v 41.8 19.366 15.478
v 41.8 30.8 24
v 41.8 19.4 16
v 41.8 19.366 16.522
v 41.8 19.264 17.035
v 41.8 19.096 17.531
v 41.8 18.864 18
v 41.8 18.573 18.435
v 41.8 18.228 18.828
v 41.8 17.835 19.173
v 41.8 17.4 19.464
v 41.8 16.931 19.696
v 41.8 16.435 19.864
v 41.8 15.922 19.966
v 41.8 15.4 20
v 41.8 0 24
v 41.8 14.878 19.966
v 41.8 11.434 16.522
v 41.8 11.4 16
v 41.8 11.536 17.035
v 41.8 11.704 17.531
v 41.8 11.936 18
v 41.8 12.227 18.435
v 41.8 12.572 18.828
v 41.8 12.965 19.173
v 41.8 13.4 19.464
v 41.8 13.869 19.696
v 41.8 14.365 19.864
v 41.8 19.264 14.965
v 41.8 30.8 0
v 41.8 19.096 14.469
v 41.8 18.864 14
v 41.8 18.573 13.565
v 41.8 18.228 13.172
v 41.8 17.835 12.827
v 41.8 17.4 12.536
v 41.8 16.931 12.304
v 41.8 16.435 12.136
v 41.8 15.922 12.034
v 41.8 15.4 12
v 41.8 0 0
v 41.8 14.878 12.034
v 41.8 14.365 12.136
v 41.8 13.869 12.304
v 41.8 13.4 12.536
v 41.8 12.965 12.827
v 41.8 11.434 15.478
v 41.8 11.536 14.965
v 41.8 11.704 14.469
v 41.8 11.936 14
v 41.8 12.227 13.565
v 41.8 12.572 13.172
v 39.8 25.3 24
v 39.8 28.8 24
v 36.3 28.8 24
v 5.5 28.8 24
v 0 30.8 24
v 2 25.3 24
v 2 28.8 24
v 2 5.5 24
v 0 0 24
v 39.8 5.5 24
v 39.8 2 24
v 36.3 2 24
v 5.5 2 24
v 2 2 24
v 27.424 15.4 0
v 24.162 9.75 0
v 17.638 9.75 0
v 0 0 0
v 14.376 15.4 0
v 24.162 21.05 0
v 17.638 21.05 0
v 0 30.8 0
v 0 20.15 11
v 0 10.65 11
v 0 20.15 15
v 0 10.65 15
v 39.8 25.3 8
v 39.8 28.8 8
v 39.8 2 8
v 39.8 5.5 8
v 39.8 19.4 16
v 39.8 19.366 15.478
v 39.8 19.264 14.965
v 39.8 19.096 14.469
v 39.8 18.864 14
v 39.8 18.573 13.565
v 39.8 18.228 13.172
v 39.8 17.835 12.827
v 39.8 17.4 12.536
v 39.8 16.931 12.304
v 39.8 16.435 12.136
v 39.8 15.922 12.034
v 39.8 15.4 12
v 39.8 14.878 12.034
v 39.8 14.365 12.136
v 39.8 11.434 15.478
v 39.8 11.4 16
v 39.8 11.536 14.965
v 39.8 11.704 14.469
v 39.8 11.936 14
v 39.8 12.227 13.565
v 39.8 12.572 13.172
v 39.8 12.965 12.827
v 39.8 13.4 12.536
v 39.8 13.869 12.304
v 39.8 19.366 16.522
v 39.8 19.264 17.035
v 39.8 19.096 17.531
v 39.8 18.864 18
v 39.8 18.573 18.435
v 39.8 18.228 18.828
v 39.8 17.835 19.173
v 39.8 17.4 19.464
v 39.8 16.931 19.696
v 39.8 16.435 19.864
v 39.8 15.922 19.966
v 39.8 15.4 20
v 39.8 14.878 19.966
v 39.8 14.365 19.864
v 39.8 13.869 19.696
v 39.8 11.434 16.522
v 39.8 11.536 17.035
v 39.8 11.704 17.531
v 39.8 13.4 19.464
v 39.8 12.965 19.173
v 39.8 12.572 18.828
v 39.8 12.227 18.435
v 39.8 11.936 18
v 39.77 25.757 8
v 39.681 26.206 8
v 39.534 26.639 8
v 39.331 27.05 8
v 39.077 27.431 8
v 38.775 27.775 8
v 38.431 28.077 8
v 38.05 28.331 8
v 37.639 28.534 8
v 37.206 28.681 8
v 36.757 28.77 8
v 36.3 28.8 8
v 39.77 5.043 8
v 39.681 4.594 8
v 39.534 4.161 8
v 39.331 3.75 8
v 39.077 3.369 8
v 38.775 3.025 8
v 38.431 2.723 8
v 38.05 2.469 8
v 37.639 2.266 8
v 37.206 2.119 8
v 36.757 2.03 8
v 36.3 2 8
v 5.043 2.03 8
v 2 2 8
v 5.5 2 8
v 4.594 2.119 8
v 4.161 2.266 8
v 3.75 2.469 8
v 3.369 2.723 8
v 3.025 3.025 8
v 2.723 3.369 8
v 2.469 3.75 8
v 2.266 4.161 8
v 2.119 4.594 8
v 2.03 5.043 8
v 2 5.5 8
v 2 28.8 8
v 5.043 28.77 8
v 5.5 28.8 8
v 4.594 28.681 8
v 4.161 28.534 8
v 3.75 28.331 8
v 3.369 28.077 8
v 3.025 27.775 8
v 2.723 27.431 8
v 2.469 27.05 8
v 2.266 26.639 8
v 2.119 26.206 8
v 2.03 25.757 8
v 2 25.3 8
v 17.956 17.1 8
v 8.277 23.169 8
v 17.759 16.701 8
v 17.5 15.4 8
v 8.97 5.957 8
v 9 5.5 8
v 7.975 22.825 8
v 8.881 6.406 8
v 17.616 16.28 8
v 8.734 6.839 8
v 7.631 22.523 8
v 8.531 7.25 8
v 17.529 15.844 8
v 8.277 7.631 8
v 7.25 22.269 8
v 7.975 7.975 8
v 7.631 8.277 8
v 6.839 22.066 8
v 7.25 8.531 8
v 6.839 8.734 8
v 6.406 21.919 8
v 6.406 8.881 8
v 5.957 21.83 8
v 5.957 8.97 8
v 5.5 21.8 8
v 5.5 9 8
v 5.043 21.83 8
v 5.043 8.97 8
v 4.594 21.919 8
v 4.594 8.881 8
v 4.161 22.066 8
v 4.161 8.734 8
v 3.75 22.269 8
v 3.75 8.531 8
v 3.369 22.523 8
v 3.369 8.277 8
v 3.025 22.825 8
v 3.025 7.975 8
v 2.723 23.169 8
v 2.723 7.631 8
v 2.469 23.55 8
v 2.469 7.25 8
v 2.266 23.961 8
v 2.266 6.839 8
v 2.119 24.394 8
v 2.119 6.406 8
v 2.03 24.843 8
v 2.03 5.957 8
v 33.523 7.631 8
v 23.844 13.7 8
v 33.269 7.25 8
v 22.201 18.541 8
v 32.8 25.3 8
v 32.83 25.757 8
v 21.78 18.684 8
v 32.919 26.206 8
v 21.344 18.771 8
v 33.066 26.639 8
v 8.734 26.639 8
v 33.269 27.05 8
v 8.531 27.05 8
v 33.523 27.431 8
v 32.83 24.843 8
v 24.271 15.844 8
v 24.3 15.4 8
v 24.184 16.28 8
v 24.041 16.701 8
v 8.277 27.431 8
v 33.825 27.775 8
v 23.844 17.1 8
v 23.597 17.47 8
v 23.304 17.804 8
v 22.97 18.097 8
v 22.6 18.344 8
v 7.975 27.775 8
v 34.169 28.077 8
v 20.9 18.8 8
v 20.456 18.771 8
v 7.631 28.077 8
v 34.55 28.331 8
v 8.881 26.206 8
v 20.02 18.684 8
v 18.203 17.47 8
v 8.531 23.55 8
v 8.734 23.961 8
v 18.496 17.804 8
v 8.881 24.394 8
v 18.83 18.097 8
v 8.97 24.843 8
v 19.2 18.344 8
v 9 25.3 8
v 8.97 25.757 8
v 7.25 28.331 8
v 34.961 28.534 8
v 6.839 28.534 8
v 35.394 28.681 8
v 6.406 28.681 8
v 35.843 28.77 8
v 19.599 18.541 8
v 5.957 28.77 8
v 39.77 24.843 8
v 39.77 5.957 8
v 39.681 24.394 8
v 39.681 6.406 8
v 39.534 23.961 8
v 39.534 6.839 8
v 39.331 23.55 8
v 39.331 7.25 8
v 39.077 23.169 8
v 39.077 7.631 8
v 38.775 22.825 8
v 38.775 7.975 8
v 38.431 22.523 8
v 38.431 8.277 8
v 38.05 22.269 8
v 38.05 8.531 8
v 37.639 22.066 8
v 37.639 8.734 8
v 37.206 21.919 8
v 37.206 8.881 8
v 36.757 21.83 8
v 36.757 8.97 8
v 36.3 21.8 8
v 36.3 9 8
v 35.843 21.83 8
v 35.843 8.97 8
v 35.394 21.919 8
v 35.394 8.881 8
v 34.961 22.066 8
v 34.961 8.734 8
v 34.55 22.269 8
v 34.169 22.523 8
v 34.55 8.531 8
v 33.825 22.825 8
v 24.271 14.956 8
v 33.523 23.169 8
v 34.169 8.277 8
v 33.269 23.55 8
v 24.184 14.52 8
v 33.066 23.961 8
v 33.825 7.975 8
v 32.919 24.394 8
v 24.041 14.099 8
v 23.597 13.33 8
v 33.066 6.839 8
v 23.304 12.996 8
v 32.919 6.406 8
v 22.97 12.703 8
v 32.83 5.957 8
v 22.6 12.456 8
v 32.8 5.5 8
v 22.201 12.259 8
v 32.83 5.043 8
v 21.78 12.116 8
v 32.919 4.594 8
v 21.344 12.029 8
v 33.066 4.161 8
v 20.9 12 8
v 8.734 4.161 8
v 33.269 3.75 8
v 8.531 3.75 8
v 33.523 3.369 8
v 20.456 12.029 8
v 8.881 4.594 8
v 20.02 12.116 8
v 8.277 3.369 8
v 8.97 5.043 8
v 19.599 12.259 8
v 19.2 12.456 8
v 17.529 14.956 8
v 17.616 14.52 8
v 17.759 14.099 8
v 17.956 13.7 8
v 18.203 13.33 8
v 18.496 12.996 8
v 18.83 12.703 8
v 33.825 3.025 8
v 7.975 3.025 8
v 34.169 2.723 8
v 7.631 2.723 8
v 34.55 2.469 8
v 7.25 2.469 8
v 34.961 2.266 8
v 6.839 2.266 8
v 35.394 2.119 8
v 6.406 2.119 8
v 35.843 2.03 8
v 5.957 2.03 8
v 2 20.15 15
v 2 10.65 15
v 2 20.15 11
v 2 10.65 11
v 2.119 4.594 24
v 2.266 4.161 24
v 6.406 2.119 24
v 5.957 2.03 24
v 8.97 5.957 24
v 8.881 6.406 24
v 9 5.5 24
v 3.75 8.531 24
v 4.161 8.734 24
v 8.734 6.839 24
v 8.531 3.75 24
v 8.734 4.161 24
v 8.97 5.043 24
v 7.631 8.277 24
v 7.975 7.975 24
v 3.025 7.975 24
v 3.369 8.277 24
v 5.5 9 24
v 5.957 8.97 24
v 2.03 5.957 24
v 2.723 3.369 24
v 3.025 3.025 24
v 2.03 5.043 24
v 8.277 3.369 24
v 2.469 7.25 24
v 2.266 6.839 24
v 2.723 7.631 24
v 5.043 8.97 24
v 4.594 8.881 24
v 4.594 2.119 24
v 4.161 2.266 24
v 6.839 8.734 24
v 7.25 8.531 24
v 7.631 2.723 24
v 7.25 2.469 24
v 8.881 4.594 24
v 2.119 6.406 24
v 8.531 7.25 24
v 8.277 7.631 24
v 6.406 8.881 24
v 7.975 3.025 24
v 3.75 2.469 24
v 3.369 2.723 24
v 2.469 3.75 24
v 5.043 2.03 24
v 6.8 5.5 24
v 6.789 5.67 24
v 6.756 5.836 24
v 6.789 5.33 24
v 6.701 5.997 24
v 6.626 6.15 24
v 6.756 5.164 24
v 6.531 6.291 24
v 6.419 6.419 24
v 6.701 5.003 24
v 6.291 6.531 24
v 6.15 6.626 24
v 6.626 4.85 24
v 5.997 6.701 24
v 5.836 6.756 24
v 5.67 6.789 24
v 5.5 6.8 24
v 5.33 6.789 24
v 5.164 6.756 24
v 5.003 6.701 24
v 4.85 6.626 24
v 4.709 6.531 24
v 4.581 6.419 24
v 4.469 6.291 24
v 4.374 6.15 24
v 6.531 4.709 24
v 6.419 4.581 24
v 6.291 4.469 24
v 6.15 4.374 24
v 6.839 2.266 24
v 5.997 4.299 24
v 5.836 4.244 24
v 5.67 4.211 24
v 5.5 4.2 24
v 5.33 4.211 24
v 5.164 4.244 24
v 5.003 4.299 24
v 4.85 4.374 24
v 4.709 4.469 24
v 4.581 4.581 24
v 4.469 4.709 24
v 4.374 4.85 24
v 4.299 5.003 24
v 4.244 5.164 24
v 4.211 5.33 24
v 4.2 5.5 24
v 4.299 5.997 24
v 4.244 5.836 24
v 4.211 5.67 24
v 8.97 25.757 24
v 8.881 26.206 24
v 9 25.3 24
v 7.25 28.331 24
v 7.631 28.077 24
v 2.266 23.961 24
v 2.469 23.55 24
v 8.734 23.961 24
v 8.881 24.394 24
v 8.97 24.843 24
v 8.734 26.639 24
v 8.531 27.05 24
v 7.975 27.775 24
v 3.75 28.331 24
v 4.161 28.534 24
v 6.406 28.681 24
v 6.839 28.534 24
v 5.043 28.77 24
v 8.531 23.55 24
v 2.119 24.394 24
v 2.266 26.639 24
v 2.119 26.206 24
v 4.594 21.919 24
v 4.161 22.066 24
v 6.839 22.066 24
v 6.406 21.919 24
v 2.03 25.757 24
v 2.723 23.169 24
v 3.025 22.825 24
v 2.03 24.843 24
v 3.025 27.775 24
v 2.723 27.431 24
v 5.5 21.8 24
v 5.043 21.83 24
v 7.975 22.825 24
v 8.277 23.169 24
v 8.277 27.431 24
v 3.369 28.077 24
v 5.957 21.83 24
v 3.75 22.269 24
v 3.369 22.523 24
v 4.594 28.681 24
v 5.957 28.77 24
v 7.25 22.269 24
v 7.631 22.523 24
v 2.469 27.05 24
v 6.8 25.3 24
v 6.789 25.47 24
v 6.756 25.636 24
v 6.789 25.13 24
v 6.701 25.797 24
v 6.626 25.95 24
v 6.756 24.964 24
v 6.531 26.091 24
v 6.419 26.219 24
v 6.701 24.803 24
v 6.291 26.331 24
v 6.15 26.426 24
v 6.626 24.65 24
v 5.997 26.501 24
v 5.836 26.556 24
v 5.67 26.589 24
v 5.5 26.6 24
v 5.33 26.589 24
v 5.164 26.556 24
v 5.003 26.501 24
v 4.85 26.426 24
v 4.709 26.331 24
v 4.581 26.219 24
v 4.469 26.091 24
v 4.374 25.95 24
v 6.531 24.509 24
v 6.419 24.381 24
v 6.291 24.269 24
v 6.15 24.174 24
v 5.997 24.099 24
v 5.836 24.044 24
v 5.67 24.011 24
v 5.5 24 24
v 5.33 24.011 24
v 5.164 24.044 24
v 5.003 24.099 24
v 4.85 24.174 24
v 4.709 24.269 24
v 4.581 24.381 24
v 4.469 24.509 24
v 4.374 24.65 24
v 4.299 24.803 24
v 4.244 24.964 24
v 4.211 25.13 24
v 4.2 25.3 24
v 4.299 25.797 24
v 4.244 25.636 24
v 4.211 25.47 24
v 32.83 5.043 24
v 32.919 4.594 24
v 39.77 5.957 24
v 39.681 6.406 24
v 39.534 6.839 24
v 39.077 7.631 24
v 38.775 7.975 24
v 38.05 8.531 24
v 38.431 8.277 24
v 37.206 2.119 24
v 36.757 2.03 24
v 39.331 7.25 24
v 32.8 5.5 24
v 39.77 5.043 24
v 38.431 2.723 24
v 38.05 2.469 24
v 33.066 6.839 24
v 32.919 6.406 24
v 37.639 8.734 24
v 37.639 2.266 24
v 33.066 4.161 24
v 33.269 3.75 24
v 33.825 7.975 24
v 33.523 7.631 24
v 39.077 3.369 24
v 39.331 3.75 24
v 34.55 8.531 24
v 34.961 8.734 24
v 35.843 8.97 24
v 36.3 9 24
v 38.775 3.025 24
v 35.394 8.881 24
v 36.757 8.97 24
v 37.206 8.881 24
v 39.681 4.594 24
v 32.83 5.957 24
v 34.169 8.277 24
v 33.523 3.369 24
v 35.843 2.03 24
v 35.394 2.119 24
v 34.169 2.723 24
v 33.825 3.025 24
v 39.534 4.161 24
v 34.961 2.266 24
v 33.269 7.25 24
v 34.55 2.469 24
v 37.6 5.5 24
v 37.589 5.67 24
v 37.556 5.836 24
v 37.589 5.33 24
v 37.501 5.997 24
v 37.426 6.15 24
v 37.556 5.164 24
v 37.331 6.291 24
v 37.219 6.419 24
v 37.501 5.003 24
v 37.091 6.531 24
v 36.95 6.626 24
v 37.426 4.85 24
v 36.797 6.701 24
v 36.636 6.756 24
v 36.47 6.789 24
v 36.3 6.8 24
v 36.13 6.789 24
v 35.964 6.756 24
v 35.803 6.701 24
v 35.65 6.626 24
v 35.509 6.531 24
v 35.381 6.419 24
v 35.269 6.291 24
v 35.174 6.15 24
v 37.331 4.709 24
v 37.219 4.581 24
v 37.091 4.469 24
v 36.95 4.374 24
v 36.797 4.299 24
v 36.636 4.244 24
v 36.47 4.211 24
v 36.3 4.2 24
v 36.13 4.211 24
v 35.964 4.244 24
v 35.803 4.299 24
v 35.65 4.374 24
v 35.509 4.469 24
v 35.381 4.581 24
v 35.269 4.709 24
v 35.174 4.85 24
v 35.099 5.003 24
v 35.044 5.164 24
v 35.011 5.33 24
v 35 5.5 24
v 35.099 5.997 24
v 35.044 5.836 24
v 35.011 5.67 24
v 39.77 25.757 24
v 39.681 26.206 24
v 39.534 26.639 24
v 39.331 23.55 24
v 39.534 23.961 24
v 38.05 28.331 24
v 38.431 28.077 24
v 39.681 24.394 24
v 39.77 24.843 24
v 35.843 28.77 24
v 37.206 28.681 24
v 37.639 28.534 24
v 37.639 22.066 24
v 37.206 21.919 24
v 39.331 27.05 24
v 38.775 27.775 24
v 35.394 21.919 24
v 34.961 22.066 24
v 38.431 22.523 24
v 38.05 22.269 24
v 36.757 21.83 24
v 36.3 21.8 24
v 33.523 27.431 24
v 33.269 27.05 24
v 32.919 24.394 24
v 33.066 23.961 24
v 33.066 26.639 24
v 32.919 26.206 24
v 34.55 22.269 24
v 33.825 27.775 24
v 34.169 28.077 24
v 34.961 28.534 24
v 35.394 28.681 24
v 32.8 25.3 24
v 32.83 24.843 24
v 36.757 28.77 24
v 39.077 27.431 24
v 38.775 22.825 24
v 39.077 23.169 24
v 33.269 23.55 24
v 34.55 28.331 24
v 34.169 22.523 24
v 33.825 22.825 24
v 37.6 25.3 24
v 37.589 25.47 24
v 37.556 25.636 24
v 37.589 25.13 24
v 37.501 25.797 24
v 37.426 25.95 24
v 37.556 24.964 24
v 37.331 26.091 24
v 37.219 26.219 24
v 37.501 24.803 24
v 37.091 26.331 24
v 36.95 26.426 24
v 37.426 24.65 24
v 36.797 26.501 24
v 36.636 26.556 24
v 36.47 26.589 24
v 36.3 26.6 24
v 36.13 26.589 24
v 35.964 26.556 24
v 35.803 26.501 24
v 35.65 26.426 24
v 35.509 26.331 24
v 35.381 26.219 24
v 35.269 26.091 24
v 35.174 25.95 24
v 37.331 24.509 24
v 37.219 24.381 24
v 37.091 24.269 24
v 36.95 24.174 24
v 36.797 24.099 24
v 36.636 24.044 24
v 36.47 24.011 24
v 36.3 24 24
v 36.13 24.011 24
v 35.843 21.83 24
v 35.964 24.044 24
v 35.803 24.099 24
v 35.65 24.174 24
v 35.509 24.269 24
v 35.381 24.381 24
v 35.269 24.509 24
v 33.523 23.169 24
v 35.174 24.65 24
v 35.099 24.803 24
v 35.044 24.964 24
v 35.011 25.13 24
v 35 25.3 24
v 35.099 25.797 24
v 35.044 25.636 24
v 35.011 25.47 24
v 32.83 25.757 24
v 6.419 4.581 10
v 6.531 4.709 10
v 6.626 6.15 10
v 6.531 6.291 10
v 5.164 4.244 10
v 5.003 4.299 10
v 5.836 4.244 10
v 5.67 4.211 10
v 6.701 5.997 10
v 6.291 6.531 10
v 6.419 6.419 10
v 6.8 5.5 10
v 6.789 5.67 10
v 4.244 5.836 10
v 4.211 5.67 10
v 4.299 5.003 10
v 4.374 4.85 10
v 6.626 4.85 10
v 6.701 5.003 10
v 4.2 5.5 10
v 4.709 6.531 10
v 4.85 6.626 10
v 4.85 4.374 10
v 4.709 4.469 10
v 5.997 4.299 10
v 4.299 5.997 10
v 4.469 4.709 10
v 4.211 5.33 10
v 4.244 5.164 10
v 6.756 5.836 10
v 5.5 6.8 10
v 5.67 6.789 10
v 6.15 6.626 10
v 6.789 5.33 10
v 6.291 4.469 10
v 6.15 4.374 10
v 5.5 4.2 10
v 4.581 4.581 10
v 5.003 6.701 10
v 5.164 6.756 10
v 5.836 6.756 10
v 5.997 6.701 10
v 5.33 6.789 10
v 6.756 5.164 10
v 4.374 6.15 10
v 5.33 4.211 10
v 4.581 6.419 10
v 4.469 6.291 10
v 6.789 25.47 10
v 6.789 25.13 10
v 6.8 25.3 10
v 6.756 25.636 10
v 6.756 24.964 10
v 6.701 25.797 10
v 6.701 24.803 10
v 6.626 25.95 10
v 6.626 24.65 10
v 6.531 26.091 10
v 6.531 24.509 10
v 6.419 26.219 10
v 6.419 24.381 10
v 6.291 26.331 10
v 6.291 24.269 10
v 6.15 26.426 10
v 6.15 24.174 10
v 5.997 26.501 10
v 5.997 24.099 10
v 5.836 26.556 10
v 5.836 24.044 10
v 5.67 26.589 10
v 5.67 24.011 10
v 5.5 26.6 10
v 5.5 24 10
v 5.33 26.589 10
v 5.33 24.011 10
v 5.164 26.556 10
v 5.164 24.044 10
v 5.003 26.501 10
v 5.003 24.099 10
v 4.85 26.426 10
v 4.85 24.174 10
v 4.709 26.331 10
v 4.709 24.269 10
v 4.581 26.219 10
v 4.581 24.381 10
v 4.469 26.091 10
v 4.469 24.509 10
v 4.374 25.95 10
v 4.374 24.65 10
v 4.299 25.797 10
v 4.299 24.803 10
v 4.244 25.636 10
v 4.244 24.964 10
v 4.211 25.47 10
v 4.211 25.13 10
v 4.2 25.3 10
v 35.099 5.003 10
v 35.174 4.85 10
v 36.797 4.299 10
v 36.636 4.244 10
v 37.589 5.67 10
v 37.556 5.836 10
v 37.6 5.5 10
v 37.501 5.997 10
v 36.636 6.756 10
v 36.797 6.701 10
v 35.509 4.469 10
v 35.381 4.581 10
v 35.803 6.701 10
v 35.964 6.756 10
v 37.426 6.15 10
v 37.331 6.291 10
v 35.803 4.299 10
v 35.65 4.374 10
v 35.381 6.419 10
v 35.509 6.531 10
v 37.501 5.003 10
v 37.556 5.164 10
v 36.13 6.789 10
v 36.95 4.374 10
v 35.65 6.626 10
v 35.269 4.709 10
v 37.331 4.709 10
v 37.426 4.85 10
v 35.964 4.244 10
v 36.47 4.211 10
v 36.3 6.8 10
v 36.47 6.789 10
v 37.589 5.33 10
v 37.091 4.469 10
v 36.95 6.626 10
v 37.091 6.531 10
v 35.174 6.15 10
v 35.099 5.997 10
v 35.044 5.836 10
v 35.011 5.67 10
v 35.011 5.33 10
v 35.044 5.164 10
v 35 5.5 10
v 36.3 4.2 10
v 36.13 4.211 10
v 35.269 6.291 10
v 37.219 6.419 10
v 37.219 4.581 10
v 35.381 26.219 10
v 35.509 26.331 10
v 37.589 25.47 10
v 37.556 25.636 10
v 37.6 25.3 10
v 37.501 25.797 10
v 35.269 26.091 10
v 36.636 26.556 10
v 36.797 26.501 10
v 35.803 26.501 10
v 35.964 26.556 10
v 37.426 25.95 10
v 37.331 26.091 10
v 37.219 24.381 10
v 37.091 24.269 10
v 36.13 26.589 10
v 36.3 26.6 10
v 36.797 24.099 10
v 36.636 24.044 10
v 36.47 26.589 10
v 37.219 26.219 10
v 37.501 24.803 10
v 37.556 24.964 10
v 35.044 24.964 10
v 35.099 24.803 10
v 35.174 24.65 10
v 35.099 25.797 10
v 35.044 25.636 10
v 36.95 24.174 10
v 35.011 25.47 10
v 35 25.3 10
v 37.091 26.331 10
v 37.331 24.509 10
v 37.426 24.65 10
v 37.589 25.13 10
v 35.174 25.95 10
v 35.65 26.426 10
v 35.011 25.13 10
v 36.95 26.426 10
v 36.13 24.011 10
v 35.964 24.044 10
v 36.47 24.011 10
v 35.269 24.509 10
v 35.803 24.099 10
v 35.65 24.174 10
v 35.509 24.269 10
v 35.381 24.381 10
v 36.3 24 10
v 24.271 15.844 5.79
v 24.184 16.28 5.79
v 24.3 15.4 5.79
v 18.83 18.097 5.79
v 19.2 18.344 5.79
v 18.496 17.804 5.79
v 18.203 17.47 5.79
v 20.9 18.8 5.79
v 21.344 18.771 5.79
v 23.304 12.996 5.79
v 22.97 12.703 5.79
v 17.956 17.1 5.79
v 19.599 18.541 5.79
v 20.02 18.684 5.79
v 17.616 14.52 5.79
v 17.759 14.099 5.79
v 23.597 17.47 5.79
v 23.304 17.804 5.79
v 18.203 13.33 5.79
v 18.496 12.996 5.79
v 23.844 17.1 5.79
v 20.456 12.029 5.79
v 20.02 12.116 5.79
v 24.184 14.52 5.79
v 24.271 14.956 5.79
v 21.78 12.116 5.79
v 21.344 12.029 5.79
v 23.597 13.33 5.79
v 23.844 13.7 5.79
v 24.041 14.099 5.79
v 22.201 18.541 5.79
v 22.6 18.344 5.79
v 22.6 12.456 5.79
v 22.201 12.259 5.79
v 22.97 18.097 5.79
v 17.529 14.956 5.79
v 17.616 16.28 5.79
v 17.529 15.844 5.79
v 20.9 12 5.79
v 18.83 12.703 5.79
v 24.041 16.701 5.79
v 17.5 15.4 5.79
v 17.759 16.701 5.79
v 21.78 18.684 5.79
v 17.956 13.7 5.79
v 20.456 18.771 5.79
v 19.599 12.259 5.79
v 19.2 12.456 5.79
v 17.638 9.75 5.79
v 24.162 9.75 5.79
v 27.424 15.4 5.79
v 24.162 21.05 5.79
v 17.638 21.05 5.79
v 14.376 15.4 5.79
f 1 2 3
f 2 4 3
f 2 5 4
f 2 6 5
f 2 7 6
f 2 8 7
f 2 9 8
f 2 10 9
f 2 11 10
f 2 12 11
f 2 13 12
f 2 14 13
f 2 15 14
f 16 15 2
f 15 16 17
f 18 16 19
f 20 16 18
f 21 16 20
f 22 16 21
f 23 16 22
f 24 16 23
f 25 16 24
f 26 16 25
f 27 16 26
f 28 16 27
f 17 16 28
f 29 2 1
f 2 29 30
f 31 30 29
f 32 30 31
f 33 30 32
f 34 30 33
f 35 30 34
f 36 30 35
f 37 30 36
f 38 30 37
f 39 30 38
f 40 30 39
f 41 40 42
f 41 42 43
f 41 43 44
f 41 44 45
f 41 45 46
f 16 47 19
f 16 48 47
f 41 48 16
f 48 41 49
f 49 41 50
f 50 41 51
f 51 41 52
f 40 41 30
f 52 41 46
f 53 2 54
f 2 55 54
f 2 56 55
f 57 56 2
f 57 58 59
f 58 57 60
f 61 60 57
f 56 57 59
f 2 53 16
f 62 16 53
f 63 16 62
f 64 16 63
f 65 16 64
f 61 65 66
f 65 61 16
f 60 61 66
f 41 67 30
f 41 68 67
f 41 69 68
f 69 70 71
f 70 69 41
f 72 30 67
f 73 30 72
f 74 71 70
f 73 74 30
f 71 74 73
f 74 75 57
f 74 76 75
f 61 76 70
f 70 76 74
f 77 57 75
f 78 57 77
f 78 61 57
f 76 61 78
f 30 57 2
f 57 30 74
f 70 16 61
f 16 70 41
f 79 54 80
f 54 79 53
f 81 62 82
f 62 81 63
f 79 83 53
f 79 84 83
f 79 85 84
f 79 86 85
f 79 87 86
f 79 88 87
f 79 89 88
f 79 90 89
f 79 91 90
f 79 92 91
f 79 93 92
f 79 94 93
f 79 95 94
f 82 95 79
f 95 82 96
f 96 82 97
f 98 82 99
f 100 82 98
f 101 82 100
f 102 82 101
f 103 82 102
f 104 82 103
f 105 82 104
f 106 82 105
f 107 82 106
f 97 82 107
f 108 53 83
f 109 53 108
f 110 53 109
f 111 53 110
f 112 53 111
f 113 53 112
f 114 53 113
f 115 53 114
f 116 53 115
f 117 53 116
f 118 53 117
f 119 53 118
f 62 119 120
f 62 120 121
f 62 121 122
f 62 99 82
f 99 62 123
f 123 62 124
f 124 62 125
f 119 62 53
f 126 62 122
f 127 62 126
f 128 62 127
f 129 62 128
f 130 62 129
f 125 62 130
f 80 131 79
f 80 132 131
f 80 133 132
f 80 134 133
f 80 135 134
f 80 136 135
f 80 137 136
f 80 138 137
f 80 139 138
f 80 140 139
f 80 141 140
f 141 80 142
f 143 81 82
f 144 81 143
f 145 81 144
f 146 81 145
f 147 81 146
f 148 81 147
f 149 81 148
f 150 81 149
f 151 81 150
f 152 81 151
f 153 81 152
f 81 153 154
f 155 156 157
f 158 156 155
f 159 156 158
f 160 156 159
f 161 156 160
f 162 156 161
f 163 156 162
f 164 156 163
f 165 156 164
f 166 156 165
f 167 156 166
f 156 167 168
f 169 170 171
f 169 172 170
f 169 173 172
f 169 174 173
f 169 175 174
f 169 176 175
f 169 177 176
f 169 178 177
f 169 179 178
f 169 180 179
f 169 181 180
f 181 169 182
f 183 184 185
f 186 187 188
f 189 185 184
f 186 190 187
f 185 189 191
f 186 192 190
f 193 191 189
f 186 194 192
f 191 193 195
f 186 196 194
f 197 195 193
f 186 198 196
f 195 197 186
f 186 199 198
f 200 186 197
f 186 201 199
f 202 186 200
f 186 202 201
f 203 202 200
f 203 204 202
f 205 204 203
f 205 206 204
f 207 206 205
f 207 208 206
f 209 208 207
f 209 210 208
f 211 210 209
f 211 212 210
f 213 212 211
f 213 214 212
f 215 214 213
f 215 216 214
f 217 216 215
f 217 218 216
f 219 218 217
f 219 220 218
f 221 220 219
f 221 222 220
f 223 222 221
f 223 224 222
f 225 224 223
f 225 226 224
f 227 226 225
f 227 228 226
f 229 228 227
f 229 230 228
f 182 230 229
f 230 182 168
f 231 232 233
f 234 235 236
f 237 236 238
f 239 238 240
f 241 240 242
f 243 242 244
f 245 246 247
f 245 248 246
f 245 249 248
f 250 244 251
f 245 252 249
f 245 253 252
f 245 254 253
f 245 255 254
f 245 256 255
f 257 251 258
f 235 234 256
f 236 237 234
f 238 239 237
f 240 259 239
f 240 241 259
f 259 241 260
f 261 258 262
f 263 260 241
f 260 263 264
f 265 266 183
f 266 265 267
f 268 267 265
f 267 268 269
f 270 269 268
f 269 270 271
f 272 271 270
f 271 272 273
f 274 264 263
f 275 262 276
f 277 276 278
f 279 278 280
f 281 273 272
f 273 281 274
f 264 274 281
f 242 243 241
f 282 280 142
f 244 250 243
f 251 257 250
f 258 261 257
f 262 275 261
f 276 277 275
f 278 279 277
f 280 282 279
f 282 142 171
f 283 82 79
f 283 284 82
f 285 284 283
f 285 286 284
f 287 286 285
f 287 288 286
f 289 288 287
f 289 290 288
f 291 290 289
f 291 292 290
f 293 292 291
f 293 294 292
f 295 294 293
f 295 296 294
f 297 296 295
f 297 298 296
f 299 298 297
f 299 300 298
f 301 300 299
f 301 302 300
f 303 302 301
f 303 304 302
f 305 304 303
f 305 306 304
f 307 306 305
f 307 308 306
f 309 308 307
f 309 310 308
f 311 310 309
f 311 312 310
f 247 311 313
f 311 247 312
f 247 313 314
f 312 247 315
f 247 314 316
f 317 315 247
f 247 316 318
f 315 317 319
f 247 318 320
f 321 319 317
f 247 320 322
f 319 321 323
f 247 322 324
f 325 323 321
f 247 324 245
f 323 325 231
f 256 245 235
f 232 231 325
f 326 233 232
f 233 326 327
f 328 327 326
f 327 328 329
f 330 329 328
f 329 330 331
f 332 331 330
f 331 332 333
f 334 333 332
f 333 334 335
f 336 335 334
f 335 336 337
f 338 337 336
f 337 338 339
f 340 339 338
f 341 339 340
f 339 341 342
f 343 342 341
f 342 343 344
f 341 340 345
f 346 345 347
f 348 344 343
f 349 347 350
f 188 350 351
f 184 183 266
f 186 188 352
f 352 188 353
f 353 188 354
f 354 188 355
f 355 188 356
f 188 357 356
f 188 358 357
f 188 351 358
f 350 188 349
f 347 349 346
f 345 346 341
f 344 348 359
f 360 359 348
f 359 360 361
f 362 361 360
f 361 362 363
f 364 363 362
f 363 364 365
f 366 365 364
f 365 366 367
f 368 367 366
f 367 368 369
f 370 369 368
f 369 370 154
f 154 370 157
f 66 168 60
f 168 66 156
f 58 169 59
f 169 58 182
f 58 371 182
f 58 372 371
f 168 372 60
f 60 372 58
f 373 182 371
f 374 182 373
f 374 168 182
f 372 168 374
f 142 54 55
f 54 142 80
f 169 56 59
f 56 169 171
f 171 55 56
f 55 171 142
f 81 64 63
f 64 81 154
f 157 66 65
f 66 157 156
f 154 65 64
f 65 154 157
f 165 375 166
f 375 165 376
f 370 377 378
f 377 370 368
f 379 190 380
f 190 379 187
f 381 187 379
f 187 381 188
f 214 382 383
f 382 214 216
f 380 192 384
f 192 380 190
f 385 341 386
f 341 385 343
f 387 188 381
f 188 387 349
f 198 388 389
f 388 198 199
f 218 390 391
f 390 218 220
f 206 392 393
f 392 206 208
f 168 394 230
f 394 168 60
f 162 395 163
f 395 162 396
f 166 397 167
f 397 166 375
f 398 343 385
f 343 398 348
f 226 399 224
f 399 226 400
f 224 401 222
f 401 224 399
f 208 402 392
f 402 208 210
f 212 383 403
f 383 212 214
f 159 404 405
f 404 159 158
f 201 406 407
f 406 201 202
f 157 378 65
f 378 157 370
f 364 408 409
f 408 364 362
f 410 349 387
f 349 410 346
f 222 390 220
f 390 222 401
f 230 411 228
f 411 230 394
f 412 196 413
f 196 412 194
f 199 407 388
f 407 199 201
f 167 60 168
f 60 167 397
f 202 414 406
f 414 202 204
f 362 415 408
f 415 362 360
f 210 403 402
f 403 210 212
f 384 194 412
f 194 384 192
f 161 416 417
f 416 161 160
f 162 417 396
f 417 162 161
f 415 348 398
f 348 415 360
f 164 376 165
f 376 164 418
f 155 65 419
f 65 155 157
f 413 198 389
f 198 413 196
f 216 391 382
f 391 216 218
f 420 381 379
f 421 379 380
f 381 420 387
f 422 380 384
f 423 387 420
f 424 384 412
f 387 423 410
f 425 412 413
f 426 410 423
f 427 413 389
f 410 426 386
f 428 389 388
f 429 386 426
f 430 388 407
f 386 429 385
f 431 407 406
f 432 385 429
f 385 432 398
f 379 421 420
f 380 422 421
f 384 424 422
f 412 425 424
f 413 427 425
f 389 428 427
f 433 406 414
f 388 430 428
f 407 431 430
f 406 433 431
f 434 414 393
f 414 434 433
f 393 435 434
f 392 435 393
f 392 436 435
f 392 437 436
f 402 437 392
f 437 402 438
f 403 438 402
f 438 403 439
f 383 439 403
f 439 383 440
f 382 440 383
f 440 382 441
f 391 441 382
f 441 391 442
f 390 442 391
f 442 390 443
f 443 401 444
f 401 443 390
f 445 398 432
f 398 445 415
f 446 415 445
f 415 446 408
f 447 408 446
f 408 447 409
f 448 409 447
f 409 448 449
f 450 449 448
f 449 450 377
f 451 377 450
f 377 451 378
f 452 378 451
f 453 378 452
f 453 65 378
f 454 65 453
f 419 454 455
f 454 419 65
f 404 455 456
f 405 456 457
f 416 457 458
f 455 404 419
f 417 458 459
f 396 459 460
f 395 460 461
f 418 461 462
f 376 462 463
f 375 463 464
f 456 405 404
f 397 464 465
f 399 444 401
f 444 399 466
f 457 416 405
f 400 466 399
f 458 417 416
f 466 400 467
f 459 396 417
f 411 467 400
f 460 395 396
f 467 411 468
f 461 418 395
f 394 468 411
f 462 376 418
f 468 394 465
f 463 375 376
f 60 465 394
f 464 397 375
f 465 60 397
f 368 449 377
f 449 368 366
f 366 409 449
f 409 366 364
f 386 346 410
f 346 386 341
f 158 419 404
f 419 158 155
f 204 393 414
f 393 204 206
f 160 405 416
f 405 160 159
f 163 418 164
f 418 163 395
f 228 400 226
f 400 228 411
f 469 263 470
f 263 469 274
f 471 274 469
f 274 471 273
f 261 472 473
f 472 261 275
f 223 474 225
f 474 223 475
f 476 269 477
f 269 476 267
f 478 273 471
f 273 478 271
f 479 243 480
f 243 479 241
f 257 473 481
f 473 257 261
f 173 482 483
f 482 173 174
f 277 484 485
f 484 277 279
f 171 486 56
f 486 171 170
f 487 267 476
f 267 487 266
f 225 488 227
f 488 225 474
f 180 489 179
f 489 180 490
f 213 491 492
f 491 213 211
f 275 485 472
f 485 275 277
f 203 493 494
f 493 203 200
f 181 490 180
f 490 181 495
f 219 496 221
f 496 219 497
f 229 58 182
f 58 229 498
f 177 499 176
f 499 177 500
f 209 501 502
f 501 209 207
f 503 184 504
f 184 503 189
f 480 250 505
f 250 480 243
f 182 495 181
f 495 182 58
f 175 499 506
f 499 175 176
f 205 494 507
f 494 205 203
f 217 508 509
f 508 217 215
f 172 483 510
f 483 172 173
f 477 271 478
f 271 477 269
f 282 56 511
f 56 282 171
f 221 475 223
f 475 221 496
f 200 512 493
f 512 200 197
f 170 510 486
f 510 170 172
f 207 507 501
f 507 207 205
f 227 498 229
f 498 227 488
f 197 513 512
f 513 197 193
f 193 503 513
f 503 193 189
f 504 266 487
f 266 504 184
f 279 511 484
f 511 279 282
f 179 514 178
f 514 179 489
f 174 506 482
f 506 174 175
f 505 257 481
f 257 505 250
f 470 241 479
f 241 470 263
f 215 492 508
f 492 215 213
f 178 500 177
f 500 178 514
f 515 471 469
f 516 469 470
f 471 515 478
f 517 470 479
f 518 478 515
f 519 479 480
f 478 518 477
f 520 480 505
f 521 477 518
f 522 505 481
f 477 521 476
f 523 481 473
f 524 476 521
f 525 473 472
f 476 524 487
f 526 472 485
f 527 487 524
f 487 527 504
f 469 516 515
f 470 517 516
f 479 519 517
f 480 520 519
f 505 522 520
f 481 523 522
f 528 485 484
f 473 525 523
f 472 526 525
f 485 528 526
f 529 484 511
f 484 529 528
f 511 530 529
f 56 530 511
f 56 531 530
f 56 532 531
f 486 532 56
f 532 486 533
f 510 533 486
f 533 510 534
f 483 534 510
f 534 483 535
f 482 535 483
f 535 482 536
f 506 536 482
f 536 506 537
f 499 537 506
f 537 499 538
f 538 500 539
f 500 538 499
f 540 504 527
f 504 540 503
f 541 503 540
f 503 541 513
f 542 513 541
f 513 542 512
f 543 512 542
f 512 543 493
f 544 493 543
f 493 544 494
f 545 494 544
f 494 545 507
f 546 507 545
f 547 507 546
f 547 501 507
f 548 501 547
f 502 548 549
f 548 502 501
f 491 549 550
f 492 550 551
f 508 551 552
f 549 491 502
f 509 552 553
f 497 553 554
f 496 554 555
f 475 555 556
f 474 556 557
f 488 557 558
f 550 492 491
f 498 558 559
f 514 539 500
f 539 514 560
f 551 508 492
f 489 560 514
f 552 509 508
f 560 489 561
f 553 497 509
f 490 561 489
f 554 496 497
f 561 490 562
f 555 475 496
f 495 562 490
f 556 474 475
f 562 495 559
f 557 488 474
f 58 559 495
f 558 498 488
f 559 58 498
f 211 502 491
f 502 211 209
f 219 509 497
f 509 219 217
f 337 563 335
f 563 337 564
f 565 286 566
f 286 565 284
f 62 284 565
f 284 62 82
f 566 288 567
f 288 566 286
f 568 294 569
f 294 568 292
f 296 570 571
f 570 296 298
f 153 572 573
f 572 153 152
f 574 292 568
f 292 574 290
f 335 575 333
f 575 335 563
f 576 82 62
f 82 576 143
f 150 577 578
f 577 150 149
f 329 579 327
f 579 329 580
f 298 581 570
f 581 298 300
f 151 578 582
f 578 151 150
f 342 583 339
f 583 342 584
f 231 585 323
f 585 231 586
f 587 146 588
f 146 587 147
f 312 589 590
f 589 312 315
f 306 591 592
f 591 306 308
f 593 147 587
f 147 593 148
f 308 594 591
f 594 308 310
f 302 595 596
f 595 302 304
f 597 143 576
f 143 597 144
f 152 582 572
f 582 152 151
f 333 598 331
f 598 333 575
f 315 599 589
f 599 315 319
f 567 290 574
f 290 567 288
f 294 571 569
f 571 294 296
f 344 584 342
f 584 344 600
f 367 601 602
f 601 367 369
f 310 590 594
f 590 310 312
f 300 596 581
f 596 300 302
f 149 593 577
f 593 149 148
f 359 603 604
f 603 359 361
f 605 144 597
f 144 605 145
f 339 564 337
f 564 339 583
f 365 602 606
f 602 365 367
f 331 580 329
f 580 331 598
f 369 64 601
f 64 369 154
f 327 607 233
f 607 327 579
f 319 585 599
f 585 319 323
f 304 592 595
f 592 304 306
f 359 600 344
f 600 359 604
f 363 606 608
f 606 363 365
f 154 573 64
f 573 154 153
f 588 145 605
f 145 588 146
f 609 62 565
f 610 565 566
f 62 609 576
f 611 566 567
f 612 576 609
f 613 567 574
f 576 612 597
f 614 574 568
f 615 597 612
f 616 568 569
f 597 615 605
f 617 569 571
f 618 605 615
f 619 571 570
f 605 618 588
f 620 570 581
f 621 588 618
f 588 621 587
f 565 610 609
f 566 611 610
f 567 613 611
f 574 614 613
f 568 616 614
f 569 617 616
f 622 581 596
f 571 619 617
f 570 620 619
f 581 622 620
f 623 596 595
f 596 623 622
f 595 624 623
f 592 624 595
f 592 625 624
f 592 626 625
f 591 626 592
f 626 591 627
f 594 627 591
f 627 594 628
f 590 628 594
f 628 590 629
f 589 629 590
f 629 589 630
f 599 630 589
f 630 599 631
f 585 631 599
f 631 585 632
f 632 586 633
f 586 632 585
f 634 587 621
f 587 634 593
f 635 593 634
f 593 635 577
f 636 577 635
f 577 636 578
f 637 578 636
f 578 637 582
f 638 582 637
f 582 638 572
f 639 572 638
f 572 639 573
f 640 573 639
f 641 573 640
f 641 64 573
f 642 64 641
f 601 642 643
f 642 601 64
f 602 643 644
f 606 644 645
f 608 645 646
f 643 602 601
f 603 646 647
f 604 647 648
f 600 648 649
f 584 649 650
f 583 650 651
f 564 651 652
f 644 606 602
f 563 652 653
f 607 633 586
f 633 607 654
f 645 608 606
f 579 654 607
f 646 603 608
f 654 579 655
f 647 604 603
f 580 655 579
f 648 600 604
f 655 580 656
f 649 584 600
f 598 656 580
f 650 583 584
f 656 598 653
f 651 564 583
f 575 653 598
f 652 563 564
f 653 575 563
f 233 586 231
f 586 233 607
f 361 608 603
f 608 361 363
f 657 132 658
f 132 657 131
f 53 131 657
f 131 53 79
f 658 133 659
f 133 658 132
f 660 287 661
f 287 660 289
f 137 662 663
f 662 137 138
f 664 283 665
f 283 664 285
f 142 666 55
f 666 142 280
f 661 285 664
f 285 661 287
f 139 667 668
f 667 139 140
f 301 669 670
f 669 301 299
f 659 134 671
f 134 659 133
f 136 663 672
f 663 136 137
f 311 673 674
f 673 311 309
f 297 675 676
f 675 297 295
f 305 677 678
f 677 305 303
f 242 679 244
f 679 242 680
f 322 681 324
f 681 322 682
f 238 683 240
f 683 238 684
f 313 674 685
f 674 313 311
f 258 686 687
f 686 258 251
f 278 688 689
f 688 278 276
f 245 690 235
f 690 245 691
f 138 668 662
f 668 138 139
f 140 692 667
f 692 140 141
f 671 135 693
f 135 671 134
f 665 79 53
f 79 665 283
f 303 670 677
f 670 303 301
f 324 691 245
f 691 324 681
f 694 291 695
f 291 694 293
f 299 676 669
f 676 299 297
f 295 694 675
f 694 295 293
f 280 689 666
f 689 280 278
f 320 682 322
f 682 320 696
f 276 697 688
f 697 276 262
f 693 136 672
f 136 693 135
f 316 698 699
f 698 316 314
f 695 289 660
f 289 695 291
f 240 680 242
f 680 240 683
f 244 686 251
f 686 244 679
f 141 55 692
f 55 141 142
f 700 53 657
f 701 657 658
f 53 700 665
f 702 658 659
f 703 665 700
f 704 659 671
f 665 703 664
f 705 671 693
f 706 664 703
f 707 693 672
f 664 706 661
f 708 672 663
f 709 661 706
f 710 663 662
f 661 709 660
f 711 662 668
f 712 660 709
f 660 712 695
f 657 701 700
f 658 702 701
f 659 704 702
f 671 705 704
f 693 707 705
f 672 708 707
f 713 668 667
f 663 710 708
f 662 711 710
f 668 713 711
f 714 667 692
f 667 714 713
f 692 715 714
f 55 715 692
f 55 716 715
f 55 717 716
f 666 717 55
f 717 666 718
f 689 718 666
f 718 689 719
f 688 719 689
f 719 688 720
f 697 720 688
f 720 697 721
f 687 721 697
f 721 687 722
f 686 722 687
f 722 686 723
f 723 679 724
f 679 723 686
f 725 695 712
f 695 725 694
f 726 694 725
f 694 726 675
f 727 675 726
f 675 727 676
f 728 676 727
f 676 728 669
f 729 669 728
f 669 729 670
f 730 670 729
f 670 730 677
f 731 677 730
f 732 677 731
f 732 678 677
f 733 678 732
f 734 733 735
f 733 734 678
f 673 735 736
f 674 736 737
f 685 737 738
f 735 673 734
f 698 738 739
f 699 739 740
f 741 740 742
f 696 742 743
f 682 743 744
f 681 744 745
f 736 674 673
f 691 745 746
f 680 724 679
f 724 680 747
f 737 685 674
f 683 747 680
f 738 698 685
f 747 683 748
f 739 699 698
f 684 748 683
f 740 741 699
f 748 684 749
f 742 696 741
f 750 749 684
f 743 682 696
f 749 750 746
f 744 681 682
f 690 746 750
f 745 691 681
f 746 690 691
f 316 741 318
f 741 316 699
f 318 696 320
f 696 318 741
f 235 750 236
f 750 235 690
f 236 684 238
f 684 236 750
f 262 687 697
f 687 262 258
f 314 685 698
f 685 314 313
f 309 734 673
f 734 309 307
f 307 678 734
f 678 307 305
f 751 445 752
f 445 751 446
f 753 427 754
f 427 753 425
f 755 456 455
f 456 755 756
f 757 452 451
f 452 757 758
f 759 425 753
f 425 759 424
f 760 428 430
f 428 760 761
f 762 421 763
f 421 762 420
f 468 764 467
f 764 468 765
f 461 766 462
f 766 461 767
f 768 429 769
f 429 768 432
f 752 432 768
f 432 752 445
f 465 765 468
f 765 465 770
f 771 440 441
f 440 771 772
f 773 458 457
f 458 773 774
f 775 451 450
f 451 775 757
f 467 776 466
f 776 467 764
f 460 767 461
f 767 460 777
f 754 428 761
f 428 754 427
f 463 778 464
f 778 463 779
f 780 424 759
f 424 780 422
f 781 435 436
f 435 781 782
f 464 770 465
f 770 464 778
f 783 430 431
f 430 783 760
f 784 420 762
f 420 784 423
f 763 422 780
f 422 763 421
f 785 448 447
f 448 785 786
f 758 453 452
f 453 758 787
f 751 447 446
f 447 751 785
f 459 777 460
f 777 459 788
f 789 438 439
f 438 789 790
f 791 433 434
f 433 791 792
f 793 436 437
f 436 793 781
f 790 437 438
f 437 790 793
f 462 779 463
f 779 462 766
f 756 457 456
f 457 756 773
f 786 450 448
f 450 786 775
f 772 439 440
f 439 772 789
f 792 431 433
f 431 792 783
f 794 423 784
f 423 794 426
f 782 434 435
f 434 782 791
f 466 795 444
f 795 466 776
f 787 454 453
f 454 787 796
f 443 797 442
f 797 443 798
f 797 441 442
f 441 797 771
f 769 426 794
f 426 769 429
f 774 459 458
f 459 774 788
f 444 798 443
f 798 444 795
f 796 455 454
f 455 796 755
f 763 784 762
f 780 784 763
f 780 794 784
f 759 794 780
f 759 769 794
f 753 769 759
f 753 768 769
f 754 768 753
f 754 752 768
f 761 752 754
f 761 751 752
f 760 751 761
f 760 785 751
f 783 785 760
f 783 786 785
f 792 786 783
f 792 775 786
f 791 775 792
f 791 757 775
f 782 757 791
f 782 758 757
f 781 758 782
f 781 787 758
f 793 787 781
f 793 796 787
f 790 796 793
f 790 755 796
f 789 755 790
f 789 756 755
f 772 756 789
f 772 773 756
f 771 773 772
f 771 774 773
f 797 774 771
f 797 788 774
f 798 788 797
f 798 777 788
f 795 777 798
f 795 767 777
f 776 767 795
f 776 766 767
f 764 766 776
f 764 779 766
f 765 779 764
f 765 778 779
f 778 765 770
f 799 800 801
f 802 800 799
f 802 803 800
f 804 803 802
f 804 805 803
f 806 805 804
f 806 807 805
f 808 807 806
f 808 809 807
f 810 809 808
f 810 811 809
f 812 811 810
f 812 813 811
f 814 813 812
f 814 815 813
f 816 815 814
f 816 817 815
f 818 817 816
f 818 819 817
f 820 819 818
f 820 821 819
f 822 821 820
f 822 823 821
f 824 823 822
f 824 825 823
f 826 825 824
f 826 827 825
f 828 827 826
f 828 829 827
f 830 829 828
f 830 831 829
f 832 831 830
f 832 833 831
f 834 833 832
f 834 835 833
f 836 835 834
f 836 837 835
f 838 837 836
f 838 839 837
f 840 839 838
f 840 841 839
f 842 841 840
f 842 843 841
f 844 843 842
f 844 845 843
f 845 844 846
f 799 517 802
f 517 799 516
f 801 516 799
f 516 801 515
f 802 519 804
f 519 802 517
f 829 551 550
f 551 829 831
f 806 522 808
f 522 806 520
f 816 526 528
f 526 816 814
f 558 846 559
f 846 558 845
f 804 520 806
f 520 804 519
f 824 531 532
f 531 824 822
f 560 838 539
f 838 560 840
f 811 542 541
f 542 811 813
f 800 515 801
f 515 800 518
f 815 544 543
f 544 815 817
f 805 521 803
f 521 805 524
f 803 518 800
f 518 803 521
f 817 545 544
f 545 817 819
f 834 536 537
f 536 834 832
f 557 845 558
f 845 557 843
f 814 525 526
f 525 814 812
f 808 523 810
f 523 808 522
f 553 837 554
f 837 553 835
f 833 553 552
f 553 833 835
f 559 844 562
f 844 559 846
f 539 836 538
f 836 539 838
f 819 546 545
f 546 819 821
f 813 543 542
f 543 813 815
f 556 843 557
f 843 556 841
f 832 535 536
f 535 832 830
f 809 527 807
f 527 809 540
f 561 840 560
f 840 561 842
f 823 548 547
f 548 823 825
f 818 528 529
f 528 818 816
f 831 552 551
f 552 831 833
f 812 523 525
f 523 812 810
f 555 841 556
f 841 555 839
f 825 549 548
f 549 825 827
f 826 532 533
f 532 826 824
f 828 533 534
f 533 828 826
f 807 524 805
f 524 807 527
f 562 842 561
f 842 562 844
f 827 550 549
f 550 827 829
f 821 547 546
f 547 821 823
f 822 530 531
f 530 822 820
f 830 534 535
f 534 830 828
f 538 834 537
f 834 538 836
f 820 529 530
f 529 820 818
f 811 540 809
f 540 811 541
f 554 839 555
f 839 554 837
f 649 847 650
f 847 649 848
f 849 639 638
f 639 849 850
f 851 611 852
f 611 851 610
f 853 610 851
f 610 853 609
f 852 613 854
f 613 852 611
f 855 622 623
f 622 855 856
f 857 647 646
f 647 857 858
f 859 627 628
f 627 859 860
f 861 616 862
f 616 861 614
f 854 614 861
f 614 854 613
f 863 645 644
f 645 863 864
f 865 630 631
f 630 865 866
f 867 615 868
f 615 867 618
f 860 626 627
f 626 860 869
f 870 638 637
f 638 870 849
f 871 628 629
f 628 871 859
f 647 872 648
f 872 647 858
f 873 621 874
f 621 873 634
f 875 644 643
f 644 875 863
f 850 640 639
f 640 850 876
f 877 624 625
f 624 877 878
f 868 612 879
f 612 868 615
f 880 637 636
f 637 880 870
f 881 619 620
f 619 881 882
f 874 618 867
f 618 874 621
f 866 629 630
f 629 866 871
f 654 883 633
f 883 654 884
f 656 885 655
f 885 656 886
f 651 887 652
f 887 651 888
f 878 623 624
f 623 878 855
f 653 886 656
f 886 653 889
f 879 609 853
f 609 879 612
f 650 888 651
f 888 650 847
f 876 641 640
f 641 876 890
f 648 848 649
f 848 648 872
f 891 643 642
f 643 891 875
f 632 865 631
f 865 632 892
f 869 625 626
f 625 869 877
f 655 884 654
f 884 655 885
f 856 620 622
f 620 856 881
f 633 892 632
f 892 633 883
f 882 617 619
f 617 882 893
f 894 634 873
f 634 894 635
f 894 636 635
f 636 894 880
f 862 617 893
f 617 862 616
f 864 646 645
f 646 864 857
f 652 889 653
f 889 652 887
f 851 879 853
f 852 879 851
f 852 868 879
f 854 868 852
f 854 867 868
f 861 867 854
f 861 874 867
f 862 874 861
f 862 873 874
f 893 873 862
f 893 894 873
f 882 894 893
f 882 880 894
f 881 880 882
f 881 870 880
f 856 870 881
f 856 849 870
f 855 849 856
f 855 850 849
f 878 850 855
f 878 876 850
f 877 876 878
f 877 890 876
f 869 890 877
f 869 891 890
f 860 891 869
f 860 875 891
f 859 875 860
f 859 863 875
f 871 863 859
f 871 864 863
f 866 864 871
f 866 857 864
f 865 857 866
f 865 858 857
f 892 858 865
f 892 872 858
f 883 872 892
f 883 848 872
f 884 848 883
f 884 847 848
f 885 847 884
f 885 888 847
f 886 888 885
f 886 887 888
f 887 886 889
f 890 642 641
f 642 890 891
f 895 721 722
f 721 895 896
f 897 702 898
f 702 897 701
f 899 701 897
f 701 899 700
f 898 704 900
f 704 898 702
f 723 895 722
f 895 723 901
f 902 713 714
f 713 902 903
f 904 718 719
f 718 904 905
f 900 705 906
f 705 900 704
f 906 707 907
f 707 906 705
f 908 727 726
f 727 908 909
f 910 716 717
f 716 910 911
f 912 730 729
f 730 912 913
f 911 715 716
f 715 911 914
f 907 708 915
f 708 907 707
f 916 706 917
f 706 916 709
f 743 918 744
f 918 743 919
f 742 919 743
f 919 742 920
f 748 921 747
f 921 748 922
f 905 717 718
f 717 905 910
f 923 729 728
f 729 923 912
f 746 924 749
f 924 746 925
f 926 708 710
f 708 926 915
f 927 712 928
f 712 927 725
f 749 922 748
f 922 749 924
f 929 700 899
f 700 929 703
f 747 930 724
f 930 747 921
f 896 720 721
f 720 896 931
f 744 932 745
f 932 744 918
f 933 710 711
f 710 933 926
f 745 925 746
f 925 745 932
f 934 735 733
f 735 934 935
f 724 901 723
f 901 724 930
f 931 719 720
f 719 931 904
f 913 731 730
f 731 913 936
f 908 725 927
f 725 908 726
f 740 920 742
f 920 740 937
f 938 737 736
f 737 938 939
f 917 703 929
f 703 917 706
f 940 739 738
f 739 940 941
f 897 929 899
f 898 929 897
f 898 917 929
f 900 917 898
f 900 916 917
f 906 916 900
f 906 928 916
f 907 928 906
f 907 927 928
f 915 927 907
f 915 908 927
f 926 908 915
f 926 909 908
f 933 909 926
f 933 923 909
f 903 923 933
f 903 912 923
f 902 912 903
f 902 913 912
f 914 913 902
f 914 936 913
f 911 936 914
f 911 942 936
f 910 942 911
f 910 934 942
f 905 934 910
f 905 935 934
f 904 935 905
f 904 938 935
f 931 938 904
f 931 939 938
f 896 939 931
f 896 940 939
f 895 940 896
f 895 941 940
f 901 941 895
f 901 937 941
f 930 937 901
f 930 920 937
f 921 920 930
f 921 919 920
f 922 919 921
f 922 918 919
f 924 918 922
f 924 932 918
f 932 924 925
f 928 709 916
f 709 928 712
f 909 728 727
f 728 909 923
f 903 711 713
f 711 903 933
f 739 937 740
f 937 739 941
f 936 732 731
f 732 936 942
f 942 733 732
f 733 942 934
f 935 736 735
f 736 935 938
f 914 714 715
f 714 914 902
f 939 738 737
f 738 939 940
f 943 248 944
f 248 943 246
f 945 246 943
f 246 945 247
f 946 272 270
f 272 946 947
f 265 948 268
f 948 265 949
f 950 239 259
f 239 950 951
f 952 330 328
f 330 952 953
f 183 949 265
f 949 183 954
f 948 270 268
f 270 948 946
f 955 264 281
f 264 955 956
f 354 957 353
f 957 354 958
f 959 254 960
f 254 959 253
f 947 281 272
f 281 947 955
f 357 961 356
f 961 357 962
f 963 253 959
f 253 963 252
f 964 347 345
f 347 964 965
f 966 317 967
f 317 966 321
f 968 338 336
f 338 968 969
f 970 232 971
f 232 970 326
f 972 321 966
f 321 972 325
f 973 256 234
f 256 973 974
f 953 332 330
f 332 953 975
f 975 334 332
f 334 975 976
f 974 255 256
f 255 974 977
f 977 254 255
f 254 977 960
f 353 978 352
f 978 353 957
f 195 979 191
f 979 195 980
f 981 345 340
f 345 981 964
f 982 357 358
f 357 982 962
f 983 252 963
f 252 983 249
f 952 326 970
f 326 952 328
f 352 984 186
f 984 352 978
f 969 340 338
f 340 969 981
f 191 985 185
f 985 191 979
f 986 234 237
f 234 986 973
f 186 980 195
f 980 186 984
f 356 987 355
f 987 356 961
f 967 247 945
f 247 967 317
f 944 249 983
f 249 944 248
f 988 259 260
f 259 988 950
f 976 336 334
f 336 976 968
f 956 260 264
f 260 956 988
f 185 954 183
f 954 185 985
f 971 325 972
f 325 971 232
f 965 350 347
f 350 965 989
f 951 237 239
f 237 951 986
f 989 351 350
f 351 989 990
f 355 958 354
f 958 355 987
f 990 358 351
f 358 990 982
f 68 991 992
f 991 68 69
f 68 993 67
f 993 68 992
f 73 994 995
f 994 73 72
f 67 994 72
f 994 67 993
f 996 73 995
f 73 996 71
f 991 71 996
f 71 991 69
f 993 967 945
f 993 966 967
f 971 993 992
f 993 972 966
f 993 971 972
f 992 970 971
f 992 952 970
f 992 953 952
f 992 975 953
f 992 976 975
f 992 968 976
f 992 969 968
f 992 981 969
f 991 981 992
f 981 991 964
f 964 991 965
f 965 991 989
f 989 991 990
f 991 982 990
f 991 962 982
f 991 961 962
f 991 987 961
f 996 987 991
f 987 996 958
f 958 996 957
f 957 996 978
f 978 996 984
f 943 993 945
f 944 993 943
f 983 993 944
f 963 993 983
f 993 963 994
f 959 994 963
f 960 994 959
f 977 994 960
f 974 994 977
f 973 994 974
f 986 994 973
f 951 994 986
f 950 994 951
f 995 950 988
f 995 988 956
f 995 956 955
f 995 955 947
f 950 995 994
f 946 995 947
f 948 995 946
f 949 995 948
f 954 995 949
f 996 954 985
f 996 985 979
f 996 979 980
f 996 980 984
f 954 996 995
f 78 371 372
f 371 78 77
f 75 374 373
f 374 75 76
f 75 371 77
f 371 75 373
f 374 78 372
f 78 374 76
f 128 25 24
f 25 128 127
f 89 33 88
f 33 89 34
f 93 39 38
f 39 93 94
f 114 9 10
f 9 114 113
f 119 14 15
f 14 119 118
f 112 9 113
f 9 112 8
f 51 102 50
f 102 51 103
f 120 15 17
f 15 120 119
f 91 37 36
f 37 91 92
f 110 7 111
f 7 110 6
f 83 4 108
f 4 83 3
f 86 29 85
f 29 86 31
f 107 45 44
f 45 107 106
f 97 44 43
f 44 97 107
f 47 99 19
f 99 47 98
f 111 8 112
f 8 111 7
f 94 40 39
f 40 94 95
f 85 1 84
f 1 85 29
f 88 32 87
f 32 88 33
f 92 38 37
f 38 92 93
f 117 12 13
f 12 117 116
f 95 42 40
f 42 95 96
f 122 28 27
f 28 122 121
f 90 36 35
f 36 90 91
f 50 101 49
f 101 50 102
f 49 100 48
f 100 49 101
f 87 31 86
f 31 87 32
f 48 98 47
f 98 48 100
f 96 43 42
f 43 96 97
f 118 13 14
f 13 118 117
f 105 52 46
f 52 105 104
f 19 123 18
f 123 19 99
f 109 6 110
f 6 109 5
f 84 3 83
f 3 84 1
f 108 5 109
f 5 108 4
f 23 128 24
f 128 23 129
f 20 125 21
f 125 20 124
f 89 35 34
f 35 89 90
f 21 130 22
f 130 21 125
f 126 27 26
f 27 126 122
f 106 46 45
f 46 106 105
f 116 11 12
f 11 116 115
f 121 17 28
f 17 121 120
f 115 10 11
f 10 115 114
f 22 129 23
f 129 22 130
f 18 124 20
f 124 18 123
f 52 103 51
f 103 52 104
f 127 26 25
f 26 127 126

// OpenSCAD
// einfachstoppen Tor -- Gehaeuse fuer Sender und Tor (OpenSCAD).
//
// NICHT GERENDERT UND NICHT GEDRUCKT. Alle Masse unten sind Annahmen; das echte Board,
// die LED, den TSOP und die Mutter nachmessen und hier eintragen, bevor etwas gedruckt wird.
//
//   openscad -o tor_unten.stl -D 'variante="tor"'    -D 'teil="unten"'  gehaeuse/tor.scad
//   openscad -o tor_deckel.stl -D 'variante="tor"'   -D 'teil="deckel"' gehaeuse/tor.scad
//   openscad -o sender_unten.stl -D 'variante="sender"' -D 'teil="unten"' gehaeuse/tor.scad
//
// Material: PETG, 0,2 mm Schicht, 3 Wandlinien. Die Oeffnung zeigt in +X.

variante = "tor";   // "tor" (TSOP-Fenster) oder "sender" (Loch fuer eine 5-mm-LED)
teil     = "unten"; // "unten" oder "deckel"

// --- Annahmen: nachmessen! ---
board_l = 23;       // Laenge des ESP32-C3 SuperMini (X)
board_b = 18;       // Breite (Y)
usb_b   = 9.5;      // Breite der USB-C-Oeffnung
usb_h   = 4;        // Hoehe der USB-C-Oeffnung
tsop_d  = 8;        // Fenster vor dem TSOP (Roehrchen, Schrumpfschlauch ~6-8 mm)
led_d   = 5.3;      // Bohrung fuer eine 5-mm-LED
mutter_sw = 11.3;   // 1/4"-UNC-Mutter, Schluesselweite (7/16" = 11,1 mm) plus Spiel
mutter_h  = 5.8;    // Mutterhoehe plus Spiel

wand   = 2;         // Wandstaerke
boden  = 8;         // dick genug fuer die Mutter
spiel  = 0.4;       // Passungsspiel
platz_x = 14;       // Raum fuer Draht, Widerstand, Transistor hinter dem Board
platz_y = 8;
innen_h = 16;       // Innenhoehe ueber dem Boden

schraube_d = 2.6;   // Kernloch fuer Blechschraube M3
dom_d      = 7;

innen_x = board_l + 2 * spiel + platz_x;
innen_y = board_b + 2 * spiel + platz_y;
aussen_x = innen_x + 2 * wand;
aussen_y = innen_y + 2 * wand;
aussen_z = boden + innen_h;

$fn = 48;

module doeme(h) {
  for (x = [wand + dom_d / 2, aussen_x - wand - dom_d / 2])
    for (y = [wand + dom_d / 2, aussen_y - wand - dom_d / 2])
      translate([x, y, boden]) cylinder(d = dom_d, h = h);
}

module unten() {
  difference() {
    union() {
      difference() {
        cube([aussen_x, aussen_y, aussen_z]);
        translate([wand, wand, boden]) cube([innen_x, innen_y, innen_h + 1]);
      }
      doeme(innen_h);
    }
    // Schraubloecher in den Doemen
    for (x = [wand + dom_d / 2, aussen_x - wand - dom_d / 2])
      for (y = [wand + dom_d / 2, aussen_y - wand - dom_d / 2])
        translate([x, y, boden + 2]) cylinder(d = schraube_d, h = innen_h);

    // USB-C: hintere Wand (-X)
    translate([-1, aussen_y / 2 - usb_b / 2, boden + 3])
      cube([wand + 2, usb_b, usb_h]);

    // Front (+X): Fenster fuer den TSOP oder Bohrung fuer die LED
    translate([aussen_x - wand - 1, aussen_y / 2, boden + innen_h / 2])
      rotate([0, 90, 0])
        cylinder(d = (variante == "tor") ? tsop_d : led_d, h = wand + 2);

    // Stativgewinde: Sechskant fuer die Mutter von unten, Durchgang fuer die Schraube
    translate([aussen_x / 2, aussen_y / 2, -0.01]) {
      cylinder(d = 6.8, h = boden + 0.02);
      cylinder(d = mutter_sw / cos(30), h = mutter_h, $fn = 6);
    }
  }
}

module deckel() {
  difference() {
    union() {
      cube([aussen_x, aussen_y, wand]);
      // Lippe, die in die Wand greift
      translate([wand + spiel, wand + spiel, wand])
        cube([innen_x - 2 * spiel, innen_y - 2 * spiel, 2]);
    }
    for (x = [wand + dom_d / 2, aussen_x - wand - dom_d / 2])
      for (y = [wand + dom_d / 2, aussen_y - wand - dom_d / 2])
        translate([x, y, -1]) cylinder(d = 3.4, h = wand + 4);
  }
}

if (teil == "unten") unten(); else deckel();
